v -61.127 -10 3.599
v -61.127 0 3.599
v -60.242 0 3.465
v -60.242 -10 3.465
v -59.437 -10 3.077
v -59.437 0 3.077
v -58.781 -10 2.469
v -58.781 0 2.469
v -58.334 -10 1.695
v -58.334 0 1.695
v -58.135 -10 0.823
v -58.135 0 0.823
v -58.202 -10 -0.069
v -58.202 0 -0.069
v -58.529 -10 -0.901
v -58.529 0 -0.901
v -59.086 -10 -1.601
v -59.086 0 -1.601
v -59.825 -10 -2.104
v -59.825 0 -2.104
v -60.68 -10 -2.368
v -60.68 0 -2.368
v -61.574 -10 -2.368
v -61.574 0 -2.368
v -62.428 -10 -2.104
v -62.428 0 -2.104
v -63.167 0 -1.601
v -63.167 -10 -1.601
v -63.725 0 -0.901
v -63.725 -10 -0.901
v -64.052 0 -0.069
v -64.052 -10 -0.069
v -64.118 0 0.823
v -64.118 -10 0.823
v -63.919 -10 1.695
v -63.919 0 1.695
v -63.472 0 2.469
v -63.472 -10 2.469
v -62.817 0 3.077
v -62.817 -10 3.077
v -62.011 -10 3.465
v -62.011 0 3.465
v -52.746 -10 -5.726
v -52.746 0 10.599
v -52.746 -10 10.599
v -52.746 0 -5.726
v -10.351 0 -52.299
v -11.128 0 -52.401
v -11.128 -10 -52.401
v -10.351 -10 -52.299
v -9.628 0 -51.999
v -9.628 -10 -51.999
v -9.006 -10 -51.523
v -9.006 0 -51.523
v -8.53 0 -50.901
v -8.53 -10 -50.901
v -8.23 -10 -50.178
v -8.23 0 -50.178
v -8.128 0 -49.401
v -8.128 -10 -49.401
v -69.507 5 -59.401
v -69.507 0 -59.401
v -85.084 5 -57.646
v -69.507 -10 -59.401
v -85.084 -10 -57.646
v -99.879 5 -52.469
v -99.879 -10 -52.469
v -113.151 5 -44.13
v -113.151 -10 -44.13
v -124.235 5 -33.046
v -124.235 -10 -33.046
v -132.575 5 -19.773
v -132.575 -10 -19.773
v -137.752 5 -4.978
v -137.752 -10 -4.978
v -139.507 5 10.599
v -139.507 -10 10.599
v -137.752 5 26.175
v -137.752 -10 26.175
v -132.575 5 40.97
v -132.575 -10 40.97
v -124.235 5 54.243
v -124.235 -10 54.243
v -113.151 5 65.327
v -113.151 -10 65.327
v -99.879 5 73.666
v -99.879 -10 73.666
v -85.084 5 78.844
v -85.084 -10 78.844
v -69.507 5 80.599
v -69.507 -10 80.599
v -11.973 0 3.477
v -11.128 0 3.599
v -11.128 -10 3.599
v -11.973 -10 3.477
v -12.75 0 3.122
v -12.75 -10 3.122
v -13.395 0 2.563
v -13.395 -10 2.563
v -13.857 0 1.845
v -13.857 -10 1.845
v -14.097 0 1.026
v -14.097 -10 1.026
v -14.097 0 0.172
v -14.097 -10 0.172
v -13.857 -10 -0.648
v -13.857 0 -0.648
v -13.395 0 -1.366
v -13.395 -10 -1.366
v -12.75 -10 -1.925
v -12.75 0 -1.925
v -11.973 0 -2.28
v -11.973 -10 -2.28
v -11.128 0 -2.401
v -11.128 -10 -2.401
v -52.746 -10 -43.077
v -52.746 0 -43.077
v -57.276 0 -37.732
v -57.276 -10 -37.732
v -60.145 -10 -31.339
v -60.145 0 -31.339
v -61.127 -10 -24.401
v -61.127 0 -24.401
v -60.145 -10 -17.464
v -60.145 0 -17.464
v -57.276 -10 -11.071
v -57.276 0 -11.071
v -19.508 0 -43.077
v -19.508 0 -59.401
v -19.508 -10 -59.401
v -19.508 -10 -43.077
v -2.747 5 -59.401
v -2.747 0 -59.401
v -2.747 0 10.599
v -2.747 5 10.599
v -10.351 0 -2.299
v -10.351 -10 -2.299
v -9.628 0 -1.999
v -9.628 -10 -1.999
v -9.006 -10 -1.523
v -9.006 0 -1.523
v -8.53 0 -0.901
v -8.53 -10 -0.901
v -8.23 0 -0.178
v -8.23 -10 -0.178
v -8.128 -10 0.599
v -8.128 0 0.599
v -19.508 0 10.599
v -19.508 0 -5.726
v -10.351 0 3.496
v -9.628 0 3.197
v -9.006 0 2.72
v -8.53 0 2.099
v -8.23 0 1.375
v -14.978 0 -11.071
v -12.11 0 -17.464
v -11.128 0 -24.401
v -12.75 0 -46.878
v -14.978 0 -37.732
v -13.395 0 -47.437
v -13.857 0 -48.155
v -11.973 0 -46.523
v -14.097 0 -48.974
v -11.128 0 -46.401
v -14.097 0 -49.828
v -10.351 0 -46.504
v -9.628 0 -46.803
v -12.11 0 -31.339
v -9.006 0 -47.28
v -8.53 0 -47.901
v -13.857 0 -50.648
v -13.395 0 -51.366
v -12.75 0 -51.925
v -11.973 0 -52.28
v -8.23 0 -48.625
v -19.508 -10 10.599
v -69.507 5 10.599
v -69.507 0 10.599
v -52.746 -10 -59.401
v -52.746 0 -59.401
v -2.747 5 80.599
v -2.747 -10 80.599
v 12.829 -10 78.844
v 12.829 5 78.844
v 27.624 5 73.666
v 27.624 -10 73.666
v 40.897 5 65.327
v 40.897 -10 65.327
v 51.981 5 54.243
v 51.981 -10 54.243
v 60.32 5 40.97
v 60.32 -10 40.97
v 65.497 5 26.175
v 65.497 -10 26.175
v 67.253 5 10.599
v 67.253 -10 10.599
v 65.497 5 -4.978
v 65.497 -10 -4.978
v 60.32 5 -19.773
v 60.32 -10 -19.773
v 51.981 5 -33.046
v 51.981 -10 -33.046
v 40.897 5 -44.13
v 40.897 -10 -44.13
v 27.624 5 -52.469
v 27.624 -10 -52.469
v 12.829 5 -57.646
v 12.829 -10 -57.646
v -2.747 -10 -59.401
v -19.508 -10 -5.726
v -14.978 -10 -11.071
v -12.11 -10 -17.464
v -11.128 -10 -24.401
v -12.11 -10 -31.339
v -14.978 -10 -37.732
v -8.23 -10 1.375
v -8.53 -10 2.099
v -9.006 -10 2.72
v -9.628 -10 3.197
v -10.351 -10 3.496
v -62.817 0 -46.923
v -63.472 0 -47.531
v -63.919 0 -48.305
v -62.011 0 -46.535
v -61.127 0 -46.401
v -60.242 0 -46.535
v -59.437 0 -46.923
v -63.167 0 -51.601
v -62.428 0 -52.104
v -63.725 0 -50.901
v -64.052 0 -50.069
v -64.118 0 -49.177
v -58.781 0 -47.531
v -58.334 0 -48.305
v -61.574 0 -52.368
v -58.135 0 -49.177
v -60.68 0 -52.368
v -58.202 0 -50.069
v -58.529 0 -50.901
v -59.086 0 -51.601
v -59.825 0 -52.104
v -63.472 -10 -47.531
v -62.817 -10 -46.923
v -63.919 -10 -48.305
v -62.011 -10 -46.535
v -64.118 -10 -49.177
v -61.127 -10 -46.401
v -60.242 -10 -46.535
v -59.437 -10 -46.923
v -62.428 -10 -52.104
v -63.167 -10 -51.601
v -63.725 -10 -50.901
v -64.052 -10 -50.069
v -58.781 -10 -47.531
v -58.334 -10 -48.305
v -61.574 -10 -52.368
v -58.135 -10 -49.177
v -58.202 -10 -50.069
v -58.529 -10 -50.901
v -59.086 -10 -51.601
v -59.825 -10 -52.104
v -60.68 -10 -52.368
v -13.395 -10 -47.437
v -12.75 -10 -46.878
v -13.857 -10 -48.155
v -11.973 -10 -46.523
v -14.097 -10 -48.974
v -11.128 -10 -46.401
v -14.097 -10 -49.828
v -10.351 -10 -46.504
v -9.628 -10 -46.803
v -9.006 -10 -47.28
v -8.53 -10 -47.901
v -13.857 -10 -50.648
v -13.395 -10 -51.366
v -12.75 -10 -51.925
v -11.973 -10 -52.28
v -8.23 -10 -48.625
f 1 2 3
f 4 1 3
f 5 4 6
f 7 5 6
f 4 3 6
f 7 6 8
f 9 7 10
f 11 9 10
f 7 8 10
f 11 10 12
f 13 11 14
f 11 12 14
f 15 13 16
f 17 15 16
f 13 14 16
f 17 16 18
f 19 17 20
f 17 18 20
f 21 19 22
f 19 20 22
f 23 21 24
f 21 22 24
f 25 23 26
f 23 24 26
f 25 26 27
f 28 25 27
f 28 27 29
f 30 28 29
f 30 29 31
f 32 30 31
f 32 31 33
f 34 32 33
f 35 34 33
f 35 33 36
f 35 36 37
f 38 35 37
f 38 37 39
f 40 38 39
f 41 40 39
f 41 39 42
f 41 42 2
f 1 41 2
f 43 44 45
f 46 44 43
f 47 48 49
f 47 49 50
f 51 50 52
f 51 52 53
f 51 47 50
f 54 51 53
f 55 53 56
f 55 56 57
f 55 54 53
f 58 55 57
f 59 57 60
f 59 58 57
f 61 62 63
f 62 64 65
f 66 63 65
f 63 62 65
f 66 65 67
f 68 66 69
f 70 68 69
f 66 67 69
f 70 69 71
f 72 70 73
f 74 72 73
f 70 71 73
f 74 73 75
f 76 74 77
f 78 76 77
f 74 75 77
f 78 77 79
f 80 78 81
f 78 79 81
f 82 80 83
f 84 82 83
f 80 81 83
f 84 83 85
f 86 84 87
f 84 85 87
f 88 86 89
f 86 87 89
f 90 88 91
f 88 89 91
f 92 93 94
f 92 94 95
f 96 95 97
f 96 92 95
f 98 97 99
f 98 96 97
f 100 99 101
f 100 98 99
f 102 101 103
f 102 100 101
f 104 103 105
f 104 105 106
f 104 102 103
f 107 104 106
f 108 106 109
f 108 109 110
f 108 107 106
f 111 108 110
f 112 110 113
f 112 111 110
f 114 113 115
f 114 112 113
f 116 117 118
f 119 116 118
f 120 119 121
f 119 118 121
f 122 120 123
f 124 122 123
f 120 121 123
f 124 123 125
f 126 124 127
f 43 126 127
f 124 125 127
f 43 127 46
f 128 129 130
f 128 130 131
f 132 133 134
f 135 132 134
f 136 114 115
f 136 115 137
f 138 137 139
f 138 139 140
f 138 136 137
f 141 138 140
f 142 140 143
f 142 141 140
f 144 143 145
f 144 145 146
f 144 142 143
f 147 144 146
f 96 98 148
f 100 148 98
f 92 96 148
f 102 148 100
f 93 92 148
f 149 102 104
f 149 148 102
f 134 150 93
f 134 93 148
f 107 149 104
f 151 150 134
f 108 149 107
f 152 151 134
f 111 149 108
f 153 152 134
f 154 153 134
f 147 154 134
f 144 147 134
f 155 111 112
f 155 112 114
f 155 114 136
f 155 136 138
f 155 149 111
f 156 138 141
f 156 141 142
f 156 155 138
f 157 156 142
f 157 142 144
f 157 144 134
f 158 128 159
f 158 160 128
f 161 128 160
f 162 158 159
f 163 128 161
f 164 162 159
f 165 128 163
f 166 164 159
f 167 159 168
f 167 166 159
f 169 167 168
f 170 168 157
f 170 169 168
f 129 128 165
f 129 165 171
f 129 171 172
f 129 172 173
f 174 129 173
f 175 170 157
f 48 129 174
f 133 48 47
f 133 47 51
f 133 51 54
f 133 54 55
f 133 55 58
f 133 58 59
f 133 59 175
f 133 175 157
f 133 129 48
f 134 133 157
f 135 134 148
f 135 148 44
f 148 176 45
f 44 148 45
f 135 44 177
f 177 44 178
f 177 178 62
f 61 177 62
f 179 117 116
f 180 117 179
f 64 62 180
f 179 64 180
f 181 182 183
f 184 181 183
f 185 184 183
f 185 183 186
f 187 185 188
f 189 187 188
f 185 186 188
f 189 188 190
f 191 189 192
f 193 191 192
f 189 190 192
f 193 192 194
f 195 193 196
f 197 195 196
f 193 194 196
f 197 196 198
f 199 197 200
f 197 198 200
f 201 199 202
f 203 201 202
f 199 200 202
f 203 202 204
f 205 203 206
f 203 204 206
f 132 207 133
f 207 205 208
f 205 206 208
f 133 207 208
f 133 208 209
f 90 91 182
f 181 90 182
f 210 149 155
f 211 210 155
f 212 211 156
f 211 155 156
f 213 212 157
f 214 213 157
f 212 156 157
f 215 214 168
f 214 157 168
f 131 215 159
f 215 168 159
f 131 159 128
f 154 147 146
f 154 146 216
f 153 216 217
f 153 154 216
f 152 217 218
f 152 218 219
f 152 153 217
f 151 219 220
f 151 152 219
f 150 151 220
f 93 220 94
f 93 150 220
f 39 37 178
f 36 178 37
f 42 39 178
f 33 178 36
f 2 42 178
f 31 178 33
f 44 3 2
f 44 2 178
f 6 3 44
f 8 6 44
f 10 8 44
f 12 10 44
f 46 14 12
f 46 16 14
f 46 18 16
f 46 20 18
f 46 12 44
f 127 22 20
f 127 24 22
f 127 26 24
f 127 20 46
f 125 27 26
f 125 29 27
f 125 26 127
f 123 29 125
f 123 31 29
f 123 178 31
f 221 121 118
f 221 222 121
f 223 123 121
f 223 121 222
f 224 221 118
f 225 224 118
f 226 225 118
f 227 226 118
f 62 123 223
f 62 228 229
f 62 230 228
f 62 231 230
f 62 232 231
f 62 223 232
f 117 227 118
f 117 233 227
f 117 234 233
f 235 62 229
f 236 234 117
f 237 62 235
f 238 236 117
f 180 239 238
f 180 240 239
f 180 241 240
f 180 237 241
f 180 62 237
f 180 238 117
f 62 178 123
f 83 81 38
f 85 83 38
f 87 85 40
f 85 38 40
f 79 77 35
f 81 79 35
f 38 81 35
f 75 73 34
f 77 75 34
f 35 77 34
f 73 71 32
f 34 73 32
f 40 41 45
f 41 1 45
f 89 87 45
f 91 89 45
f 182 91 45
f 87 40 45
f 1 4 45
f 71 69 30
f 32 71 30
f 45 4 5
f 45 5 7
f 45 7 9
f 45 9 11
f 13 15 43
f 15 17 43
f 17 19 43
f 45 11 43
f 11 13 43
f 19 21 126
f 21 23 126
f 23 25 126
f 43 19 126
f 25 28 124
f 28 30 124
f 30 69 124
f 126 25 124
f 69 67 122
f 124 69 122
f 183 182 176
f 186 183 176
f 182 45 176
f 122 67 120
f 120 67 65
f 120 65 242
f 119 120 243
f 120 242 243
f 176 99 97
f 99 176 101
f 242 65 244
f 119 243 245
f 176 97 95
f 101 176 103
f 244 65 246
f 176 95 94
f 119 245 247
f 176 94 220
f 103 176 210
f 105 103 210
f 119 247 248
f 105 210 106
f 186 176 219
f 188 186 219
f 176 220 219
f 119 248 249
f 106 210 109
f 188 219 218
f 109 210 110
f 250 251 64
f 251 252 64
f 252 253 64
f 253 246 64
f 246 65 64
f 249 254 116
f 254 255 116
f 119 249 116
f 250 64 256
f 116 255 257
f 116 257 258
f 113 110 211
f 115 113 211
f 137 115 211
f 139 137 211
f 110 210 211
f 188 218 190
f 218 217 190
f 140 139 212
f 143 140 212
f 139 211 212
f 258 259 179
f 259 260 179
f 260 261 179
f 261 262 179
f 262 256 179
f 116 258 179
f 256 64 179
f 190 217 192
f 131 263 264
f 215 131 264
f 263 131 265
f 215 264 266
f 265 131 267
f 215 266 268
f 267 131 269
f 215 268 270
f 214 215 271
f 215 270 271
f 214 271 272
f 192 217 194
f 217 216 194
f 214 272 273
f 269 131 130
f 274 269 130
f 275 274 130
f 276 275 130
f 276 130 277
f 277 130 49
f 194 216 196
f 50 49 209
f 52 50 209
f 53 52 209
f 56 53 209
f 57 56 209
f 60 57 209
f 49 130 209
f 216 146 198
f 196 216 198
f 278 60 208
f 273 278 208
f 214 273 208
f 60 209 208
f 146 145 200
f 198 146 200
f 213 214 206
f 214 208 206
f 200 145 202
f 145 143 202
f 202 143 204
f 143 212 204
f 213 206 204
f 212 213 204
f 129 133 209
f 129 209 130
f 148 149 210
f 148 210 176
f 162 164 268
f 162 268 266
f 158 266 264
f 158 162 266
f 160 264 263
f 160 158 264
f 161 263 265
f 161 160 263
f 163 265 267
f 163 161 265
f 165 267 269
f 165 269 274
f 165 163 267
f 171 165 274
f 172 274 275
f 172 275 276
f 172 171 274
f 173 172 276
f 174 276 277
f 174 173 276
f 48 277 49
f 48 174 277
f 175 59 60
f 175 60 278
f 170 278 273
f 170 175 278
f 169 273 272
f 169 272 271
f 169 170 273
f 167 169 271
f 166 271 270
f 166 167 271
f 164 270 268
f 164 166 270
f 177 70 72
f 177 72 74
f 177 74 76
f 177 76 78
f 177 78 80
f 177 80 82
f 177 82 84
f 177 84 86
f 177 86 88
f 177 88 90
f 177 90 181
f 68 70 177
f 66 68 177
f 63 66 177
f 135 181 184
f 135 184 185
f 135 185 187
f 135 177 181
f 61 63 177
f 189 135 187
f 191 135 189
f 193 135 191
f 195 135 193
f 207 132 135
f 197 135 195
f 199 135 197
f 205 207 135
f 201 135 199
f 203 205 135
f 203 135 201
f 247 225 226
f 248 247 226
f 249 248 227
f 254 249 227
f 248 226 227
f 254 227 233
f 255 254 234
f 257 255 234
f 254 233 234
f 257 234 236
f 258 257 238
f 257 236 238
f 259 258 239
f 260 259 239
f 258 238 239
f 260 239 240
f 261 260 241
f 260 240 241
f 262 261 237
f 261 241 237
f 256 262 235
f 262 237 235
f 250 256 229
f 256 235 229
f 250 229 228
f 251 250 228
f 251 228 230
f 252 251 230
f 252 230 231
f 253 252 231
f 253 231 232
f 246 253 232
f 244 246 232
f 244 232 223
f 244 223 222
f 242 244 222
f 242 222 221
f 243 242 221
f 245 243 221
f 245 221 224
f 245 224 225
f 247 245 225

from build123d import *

# Parameters (mm, degrees)
SKETCH1_W                = 16.760563381
SKETCH1_H                = 70
BOSS_EXTRUDE1_DEPTH      = 10
SKETCH1_3_R              = 3
CUT_EXTRUDE1_DEPTH       = 20
SKETCH3_W                = 16.760563381
SKETCH3_H                = 70
SKETCH3_R                = 3
BOSS_EXTRUDE2_DEPTH      = 10
SKETCH9_R                = 24.999512183
CUT_EXTRUDE4_DEPTH       = 11
BOSS_EXTRUDE4_DEPTH      = 5
BOSS_EXTRUDE4_DEPTH_BACK = 10


with BuildPart() as part:
    # Sketch1 → Boss-Extrude1 (new body)
    with BuildSketch(Plane(origin=(0, 0, 0), x_dir=(1, 0, 0), z_dir=(0, 1, 0))):
        with Locations((-61.126760563, 24.401408451)):
            Rectangle(SKETCH1_W, SKETCH1_H)
    extrude(amount=-BOSS_EXTRUDE1_DEPTH)

    # Sketch1<3> → Cut-Extrude1 (cut)
    with BuildSketch(Plane(origin=(0, 0, 0), x_dir=(1, 0, 0), z_dir=(0, 1, 0))):
        with Locations((-61.126760563, 49.401408451)):
            Circle(SKETCH1_3_R)
        with Locations((-61.126760563, -0.598591549)):
            Circle(SKETCH1_3_R)
    extrude(amount=-CUT_EXTRUDE1_DEPTH, mode=Mode.SUBTRACT)


with BuildPart() as body_2:
    # Sketch3 → Boss-Extrude2 (new body)
    with BuildSketch(Plane(origin=(-10.44184171, 0, 0), x_dir=(1, 0, 0), z_dir=(0, 1, 0))):
        with Locations((-0.685894488, 24.401408451)):
            Rectangle(SKETCH3_W, SKETCH3_H)
        with Locations((-0.685894488, 49.401408451)):
            Circle(SKETCH3_R, mode=Mode.SUBTRACT)
        with Locations((-0.685894488, -0.598591549)):
            Circle(SKETCH3_R, mode=Mode.SUBTRACT)
    extrude(amount=-BOSS_EXTRUDE2_DEPTH)


with BuildPart() as cut_extrude4_tool:
    # Sketch9 → Cut-Extrude4 (new body)
    with BuildSketch(Plane(origin=(0, 0, 0), x_dir=(1, 0, 0), z_dir=(0, 1, 0))):
        with Locations((-36.12724838, 24.401408451)):
            Circle(SKETCH9_R)
    extrude(amount=-CUT_EXTRUDE4_DEPTH)


with BuildPart() as part_1:
    add(part.part)

    # Cut-Extrude4: cut by cut_extrude4_tool
    add(cut_extrude4_tool.part, mode=Mode.SUBTRACT)



with BuildPart() as body_2_1:
    add(body_2.part)

    # Cut-Extrude4: cut by cut_extrude4_tool
    add(cut_extrude4_tool.part, mode=Mode.SUBTRACT)


with BuildPart() as part_2:
    add(part_1.part)

    add(body_2_1.part)  # Boss-Extrude4 merges body 2
    # Sketch8 → Boss-Extrude4 (add, two sides: drawn at the far end of the back side and taken through both)
    with BuildSketch(Plane(origin=(0, 0, 0), x_dir=(1, 0, 0), z_dir=(0, 1, 0)).offset(-BOSS_EXTRUDE4_DEPTH_BACK)):
        with BuildLine():
            Line((-2.747454507, 59.401408451), (-2.747454507, -10.598591549))
            Line((-2.747454507, -10.598591549), (-19.508017888, -10.598591549))
            Line((-19.508017888, -10.598591549), (-52.746478873, -10.598591549))
            Line((-52.746478873, -10.598591549), (-69.507042254, -10.598591549))
            Line((-69.507042254, -10.598591549), (-69.507042254, 59.401408451))
            ThreePointArc((-69.507042254, 59.401408451), (-139.507042254, -10.598591549), (-69.507042254, -80.598591549))
            Line((-69.507042254, -80.598591549), (-2.747454507, -80.598591549))
            ThreePointArc((-2.747454507, -80.598591549), (67.252545493, -10.598591549), (-2.747454507, 59.401408451))
        make_face()
    extrude(amount=BOSS_EXTRUDE4_DEPTH + BOSS_EXTRUDE4_DEPTH_BACK)


solid = part_2.part
